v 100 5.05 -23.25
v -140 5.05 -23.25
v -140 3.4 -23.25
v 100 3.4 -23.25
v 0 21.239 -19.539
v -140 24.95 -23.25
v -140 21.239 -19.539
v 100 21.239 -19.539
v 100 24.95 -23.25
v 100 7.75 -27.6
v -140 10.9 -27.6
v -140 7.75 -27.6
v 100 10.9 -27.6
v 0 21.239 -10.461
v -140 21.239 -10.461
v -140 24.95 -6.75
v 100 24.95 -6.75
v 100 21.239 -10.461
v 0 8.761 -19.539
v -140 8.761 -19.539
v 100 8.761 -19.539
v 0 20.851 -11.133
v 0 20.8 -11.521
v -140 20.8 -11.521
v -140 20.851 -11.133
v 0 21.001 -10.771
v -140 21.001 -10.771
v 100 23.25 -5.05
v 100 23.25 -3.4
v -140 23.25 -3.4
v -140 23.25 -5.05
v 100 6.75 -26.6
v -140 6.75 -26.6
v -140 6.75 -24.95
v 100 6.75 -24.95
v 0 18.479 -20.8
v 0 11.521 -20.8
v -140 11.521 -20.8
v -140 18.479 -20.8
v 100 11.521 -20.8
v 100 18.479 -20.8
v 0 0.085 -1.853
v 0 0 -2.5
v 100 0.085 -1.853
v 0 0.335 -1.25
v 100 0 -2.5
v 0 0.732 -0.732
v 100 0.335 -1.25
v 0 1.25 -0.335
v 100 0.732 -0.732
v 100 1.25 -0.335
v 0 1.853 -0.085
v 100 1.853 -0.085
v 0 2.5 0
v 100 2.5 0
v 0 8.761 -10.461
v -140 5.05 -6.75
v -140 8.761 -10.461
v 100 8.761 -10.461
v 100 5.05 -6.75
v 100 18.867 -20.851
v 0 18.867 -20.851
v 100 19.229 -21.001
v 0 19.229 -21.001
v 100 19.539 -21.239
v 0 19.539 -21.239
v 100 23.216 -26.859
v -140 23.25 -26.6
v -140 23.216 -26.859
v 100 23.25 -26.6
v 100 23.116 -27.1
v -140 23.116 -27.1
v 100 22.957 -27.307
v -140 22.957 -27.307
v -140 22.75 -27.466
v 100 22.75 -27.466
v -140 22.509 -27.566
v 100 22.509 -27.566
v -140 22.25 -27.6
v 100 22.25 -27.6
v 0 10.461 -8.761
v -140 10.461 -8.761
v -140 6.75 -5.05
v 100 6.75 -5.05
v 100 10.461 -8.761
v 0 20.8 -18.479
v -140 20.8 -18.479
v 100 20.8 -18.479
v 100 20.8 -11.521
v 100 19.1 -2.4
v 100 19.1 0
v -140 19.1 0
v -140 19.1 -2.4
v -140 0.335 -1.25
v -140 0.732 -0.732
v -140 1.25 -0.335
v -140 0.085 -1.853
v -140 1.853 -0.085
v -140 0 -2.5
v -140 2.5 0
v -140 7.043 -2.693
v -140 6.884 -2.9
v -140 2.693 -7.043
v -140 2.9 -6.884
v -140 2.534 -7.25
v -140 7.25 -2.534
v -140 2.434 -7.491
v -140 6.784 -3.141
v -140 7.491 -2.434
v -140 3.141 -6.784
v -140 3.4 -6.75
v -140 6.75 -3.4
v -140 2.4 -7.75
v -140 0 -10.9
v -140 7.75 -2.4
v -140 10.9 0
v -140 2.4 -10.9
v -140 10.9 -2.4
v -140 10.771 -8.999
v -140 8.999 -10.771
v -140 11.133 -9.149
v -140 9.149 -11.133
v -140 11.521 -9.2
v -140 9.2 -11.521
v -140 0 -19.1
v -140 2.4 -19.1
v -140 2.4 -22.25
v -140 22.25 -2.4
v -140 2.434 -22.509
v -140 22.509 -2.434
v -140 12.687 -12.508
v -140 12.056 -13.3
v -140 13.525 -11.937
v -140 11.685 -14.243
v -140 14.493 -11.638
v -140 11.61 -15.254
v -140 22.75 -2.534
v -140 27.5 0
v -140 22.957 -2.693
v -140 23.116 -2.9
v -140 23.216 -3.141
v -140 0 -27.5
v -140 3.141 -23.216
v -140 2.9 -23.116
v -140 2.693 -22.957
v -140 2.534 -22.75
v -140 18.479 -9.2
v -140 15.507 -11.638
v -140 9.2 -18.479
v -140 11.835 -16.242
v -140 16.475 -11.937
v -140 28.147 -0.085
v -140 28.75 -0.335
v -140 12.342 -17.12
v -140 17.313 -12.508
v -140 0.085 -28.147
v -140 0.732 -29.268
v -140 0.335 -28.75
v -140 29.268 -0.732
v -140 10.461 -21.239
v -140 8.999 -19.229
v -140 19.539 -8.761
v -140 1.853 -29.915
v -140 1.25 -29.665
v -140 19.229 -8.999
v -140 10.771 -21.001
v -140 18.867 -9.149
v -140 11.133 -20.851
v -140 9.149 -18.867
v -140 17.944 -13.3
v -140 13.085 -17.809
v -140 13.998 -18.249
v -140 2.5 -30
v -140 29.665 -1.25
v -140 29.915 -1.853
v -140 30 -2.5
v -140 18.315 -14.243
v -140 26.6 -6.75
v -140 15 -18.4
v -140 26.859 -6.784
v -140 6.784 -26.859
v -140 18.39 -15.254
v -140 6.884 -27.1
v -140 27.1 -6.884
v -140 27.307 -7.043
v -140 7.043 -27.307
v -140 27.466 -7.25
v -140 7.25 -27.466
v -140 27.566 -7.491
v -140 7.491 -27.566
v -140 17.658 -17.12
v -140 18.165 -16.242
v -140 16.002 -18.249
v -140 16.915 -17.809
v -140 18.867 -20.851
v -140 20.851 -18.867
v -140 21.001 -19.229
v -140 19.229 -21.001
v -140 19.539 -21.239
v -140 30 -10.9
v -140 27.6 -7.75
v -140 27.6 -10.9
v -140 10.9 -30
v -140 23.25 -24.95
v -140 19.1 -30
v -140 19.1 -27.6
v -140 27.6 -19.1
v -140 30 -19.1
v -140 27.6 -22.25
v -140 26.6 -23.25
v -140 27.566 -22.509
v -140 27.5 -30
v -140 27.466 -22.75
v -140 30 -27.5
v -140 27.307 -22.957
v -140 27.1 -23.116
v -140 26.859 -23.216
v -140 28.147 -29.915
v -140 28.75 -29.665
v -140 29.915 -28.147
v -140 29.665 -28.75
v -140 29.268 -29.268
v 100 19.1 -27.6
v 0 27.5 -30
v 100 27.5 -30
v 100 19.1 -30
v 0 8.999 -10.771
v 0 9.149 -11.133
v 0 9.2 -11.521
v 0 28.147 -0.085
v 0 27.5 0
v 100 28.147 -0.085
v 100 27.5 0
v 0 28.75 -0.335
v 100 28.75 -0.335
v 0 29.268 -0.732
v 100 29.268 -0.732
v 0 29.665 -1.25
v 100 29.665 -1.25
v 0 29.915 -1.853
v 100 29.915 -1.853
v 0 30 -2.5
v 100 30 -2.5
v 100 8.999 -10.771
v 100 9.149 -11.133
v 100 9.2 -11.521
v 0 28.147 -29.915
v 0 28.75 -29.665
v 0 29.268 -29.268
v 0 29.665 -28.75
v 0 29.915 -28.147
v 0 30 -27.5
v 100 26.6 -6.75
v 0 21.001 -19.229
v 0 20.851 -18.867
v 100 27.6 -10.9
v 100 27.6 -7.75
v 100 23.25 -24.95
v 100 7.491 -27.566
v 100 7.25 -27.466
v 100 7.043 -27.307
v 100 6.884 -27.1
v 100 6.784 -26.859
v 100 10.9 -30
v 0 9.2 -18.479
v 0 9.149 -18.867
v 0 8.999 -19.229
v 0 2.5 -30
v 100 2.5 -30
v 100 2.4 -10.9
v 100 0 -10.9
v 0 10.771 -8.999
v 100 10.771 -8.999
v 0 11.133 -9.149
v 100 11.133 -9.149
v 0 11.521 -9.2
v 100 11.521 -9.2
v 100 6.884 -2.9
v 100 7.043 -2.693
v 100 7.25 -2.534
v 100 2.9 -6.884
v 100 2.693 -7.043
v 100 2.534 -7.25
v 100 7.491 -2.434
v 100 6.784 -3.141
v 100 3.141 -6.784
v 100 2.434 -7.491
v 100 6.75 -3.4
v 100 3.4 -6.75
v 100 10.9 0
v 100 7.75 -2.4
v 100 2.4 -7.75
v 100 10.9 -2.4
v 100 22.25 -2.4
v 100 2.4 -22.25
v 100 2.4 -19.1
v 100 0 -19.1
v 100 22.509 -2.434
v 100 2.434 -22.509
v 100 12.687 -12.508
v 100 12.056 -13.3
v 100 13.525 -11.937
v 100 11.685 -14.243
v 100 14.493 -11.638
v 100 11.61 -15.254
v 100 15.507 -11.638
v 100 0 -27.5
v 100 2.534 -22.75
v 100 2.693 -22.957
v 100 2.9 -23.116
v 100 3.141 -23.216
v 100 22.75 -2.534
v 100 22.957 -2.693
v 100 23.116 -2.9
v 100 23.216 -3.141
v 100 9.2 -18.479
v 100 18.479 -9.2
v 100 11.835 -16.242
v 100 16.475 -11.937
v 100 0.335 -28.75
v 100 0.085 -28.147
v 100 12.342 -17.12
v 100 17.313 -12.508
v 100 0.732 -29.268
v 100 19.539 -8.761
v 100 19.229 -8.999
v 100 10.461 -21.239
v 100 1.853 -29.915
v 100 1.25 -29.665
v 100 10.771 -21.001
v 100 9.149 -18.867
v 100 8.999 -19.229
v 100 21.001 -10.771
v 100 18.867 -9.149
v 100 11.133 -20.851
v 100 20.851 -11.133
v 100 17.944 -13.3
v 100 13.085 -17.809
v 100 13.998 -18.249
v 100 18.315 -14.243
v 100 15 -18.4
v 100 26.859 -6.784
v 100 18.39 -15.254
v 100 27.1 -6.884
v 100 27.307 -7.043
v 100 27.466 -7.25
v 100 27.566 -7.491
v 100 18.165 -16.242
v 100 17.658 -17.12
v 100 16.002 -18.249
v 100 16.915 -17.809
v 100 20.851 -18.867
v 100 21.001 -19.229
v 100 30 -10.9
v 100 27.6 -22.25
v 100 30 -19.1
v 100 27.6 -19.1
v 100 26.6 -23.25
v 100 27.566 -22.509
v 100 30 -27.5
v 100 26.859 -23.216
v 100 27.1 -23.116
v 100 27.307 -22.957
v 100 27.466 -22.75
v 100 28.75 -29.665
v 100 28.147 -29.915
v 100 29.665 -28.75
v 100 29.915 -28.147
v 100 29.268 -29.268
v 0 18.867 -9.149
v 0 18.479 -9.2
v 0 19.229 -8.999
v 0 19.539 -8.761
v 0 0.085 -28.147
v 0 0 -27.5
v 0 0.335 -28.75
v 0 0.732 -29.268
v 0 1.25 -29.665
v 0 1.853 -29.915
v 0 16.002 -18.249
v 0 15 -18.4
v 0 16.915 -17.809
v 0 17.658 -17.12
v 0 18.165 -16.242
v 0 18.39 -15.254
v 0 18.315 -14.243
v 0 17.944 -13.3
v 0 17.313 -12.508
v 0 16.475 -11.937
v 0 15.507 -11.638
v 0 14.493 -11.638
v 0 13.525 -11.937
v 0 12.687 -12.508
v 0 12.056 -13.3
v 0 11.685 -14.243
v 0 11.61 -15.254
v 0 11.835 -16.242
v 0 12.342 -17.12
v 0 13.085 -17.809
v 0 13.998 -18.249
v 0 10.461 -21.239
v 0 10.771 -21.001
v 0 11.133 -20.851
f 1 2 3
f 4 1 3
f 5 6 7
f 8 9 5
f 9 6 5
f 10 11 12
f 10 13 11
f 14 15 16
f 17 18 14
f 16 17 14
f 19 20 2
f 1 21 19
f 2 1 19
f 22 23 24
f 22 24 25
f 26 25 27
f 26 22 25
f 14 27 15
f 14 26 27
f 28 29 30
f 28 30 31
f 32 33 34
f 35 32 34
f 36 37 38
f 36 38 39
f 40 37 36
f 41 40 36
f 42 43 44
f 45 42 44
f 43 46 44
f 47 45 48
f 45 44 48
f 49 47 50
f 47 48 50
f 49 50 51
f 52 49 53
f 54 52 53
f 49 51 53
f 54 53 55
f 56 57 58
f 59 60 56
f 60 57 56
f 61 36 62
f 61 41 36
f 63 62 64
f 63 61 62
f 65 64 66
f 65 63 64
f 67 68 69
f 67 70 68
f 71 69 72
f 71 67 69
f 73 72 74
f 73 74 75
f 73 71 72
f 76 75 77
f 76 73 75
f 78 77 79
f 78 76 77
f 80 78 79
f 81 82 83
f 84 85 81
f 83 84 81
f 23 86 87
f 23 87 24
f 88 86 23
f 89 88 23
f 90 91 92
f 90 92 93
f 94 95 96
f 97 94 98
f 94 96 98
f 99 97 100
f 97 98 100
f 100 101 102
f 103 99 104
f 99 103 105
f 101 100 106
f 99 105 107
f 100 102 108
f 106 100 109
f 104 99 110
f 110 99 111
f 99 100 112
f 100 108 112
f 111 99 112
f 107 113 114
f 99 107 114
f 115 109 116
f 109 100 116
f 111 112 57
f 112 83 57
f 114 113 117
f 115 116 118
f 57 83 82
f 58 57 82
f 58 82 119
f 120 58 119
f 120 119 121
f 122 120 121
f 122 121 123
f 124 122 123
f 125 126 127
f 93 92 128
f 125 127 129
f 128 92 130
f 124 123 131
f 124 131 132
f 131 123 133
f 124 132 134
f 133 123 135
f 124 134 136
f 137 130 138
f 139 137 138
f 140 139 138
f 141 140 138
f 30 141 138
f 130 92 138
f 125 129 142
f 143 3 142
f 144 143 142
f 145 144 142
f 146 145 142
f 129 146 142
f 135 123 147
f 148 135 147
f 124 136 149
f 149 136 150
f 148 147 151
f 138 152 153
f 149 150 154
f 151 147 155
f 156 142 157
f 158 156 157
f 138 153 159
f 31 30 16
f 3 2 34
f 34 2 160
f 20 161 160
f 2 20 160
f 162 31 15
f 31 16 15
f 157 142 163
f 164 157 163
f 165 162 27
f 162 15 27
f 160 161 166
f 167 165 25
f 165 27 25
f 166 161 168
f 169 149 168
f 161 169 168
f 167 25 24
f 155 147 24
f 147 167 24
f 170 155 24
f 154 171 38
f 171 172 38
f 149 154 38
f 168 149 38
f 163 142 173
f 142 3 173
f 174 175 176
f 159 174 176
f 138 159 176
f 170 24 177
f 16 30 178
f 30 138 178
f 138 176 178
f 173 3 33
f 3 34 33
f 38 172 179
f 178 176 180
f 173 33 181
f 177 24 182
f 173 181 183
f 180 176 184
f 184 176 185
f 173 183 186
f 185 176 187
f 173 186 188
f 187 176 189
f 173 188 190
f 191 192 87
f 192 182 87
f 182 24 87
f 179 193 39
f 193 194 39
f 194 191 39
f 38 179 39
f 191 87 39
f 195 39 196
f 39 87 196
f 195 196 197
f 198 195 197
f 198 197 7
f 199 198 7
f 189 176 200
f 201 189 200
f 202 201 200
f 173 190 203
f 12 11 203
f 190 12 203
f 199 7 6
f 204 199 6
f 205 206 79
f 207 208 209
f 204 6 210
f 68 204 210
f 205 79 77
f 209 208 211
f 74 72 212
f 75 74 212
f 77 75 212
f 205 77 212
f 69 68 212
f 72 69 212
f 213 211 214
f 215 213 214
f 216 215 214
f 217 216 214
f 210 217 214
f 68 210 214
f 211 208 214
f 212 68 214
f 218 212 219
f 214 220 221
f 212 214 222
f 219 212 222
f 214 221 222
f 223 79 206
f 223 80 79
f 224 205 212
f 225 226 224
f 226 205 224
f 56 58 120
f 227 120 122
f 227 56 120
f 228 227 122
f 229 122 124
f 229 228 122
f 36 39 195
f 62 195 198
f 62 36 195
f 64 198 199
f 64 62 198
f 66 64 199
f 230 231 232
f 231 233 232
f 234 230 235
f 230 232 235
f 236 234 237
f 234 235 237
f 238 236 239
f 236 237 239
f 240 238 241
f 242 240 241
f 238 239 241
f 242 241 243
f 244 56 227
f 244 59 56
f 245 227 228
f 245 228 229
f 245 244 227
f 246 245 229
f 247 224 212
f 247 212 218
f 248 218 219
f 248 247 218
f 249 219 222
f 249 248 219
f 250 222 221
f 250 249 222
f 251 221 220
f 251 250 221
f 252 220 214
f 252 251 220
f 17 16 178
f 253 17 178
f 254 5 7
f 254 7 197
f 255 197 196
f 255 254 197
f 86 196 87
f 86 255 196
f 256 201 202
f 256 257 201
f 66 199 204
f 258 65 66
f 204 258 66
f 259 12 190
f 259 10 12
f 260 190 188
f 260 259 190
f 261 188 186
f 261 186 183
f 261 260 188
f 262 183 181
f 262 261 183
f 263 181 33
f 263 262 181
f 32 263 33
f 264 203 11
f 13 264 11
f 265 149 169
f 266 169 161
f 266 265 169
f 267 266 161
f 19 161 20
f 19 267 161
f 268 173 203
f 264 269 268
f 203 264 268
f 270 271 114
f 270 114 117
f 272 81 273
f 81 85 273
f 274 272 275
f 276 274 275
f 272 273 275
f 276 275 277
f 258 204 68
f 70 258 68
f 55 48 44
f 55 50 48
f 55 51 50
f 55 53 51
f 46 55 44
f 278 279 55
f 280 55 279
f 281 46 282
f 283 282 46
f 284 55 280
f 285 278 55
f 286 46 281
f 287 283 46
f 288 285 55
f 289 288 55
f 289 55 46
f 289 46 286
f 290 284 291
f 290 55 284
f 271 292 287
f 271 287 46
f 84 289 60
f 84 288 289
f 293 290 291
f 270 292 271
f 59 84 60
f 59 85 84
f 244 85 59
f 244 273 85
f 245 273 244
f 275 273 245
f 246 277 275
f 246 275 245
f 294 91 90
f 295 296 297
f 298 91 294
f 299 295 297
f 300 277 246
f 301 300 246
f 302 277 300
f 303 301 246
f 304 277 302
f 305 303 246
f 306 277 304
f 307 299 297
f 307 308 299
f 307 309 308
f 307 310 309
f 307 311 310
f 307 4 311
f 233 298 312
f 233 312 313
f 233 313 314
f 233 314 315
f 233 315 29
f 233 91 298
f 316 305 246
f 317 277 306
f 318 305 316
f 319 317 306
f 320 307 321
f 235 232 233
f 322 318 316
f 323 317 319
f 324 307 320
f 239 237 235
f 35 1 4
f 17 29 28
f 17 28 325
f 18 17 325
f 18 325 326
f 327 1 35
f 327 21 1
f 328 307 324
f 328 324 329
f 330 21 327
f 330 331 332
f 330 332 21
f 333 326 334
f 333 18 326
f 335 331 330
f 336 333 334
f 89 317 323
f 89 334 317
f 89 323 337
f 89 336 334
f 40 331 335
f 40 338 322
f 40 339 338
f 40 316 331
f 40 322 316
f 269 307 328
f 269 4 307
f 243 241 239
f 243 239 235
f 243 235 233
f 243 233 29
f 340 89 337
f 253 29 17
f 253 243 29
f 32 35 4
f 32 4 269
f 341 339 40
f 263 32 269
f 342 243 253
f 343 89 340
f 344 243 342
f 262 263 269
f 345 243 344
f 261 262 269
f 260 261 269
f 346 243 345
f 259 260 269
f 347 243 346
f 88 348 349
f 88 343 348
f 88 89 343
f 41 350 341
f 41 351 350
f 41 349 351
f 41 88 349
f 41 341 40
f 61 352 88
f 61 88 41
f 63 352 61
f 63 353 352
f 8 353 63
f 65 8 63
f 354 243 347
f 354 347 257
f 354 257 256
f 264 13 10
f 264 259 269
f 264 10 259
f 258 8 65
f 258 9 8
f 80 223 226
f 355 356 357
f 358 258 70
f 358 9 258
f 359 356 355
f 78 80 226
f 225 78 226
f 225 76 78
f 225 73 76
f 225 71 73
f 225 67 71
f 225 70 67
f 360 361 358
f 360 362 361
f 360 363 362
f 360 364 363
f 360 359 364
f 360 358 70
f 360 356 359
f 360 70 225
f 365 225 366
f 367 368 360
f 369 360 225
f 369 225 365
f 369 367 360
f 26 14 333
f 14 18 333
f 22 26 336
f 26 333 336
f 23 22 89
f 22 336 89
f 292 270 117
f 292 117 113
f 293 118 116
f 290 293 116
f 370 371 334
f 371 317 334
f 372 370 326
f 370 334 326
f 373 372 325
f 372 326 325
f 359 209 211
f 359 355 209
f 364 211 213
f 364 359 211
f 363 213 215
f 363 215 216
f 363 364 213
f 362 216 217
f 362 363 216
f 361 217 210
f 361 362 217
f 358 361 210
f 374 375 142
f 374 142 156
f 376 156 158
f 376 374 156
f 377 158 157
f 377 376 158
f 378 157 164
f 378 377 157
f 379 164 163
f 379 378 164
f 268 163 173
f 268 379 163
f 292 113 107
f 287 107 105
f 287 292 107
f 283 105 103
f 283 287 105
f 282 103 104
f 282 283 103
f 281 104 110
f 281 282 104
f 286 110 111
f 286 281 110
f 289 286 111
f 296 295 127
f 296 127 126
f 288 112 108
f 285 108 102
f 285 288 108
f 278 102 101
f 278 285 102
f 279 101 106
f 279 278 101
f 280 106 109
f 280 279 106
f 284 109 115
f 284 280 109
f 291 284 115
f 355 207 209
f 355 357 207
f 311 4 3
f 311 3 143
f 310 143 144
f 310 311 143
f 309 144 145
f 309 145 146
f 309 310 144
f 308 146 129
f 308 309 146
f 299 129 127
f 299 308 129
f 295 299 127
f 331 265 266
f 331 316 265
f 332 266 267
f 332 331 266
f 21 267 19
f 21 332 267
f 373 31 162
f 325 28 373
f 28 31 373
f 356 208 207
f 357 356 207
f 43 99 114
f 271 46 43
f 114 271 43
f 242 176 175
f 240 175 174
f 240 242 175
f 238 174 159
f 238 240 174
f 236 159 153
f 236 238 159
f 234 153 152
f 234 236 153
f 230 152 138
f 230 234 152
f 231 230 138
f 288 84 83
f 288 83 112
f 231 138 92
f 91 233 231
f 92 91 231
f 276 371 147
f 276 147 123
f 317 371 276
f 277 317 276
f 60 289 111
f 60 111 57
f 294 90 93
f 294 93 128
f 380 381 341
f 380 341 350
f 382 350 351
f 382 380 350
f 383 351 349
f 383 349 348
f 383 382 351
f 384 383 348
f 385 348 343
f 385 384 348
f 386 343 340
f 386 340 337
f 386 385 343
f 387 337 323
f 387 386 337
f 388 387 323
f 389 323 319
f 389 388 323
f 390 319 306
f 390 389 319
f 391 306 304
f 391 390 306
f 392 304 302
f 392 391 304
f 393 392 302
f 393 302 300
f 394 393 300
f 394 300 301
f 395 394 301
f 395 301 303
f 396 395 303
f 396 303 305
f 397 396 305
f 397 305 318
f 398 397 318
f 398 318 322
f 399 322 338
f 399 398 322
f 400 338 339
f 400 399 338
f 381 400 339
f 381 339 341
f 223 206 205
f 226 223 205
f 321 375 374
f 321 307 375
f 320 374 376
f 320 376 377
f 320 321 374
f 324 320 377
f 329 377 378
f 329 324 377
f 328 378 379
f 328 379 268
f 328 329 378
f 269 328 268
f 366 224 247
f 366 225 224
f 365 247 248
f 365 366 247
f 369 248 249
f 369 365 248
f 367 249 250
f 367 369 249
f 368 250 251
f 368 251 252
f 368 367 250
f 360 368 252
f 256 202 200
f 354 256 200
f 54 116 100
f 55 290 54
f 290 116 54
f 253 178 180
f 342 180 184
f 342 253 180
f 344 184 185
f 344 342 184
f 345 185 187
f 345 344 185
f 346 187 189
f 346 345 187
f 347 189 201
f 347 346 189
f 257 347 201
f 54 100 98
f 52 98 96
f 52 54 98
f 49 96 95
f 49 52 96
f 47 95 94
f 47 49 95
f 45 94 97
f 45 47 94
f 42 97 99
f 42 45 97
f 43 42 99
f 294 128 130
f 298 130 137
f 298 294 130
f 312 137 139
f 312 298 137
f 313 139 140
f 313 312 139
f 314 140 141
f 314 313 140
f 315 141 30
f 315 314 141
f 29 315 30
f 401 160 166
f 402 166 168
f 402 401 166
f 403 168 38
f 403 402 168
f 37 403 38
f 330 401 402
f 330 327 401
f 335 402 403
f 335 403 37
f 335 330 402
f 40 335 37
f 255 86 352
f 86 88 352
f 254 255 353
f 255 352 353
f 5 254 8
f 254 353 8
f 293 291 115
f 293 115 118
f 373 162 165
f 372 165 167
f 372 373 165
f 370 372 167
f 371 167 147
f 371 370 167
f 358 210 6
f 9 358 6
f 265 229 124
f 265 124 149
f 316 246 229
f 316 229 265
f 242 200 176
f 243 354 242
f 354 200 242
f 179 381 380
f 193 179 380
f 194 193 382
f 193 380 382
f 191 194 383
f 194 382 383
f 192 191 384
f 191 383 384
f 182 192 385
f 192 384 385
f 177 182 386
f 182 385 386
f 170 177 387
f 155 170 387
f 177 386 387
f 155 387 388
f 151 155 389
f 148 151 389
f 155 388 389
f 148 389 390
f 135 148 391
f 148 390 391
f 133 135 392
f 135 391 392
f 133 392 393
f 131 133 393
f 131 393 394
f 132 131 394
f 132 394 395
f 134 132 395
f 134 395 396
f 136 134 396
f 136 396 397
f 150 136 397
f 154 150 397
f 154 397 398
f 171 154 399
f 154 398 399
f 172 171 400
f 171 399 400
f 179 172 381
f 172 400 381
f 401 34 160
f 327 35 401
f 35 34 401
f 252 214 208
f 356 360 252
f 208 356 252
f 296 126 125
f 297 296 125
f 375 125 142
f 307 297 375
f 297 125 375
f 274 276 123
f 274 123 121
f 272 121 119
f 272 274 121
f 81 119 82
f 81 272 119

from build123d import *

# Parameters (mm, degrees)
SKETCH1_R           = 3.4
BOSS_EXTRUDE2_DEPTH = 100
FILLET5_R           = 2.5
FILLET6_R           = 1.5
FILLET7_R           = 1.5
FILLET8_R           = 1
SKETCH3_R           = 3.4
BOSS_EXTRUDE3_DEPTH = 140


with BuildPart() as part:
    # Sketch1 → Boss-Extrude2 (new body)
    with BuildSketch(Plane(origin=(0, 0, 0), x_dir=(0, 0, -1), z_dir=(1, 0, 0))):
        Polygon((10.9, 0), (10.9, 2.4), (6.75, 2.4), (6.75, 5.05), (10.9, 9.2), (19.1, 9.2), (23.25, 5.05), (23.25, 2.4), (19.1, 2.4), (19.1, 0), (30, 0), (30, 10.9), (27.6, 10.9), (27.6, 6.75), (24.95, 6.75), (20.8, 10.9), (20.8, 19.1), (24.95, 23.25), (27.6, 23.25), (27.6, 19.1), (30, 19.1), (30, 30), (19.1, 30), (19.1, 27.6), (23.25, 27.6), (23.25, 24.95), (19.1, 20.8), (10.9, 20.8), (6.75, 24.95), (6.75, 27.6), (10.9, 27.6), (10.9, 30), (0, 30), (0, 19.1), (2.4, 19.1), (2.4, 23.25), (5.05, 23.25), (9.2, 19.1), (9.2, 10.9), (5.05, 6.75), (2.4, 6.75), (2.4, 10.9), (0, 10.9), (0, 0), align=None)
        with Locations((15, 15)):
            Circle(SKETCH1_R, mode=Mode.SUBTRACT)
    extrude(amount=BOSS_EXTRUDE2_DEPTH)

    # Fillet5
    fillet5_edges = [part.edges().sort_by_distance(p)[0] for p in [
        (50, 30, 0),
        (50, 30, -30),
        (50, 0, -30),
        (50, 0, 0),
    ]]
    fillet(fillet5_edges, radius=FILLET5_R)

    # Fillet6
    fillet6_edges = [part.edges().sort_by_distance(p)[0] for p in [
        (50, 10.9, -9.2),
        (50, 19.1, -9.2),
        (50, 19.1, -20.8),
        (50, 10.9, -20.8),
        (50, 9.2, -19.1),
        (50, 9.2, -10.9),
    ]]
    fillet(fillet6_edges, radius=FILLET6_R)

    # Fillet7
    fillet7_edges = [part.edges().sort_by_distance(p)[0] for p in [
        (50, 20.8, -10.9),
        (50, 20.8, -19.1),
    ]]
    fillet(fillet7_edges, radius=FILLET7_R)

    # Fillet8
    fillet8_edges = [part.edges().sort_by_distance(p)[0] for p in [
        (50, 6.75, -2.4),
        (50, 23.25, -2.4),
        (50, 27.6, -6.75),
        (50, 27.6, -23.25),
        (50, 23.25, -27.6),
        (50, 6.75, -27.6),
        (50, 2.4, -23.25),
        (50, 2.4, -6.75),
    ]]
    fillet(fillet8_edges, radius=FILLET8_R)

    # Sketch3 → Boss-Extrude3 (add)
    with BuildSketch(Plane(origin=(0, 0, 0), x_dir=(0, 0, -1), z_dir=(1, 0, 0))):
        with BuildLine():
            Line((10.9, 27.6), (10.9, 30))
            Line((10.9, 30), (2.5, 30))
            ThreePointArc((2.5, 30), (0.732233047, 29.267766953), (0, 27.5))
            Line((0, 27.5), (0, 19.1))
            Line((0, 19.1), (2.4, 19.1))
            Line((2.4, 19.1), (2.4, 22.25))
            ThreePointArc((2.4, 22.25), (2.692893219, 22.957106781), (3.4, 23.25))
            Line((3.4, 23.25), (5.05, 23.25))
            Line((5.05, 23.25), (8.760660172, 19.539339828))
            ThreePointArc((8.760660172, 19.539339828), (9.085819299, 19.052704805), (9.2, 18.478679656))
            Line((9.2, 18.478679656), (9.2, 11.521320344))
            ThreePointArc((9.2, 11.521320344), (9.085819299, 10.947295195), (8.760660172, 10.460660172))
            Line((8.760660172, 10.460660172), (5.05, 6.75))
            Line((5.05, 6.75), (3.4, 6.75))
            ThreePointArc((3.4, 6.75), (2.692893219, 7.042893219), (2.4, 7.75))
            Line((2.4, 7.75), (2.4, 10.9))
            Line((2.4, 10.9), (0, 10.9))
            Line((0, 10.9), (0, 2.5))
            ThreePointArc((0, 2.5), (0.732233047, 0.732233047), (2.5, 0))
            Line((2.5, 0), (10.9, 0))
            Line((10.9, 0), (10.9, 2.4))
            Line((10.9, 2.4), (7.75, 2.4))
            ThreePointArc((7.75, 2.4), (7.042893219, 2.692893219), (6.75, 3.4))
            Line((6.75, 3.4), (6.75, 5.05))
            Line((6.75, 5.05), (10.460660172, 8.760660172))
            ThreePointArc((10.460660172, 8.760660172), (10.947295195, 9.085819299), (11.521320344, 9.2))
            Line((11.521320344, 9.2), (18.478679656, 9.2))
            ThreePointArc((18.478679656, 9.2), (19.052704805, 9.085819299), (19.539339828, 8.760660172))
            Line((19.539339828, 8.760660172), (23.25, 5.05))
            Line((23.25, 5.05), (23.25, 3.4))
            ThreePointArc((23.25, 3.4), (22.957106781, 2.692893219), (22.25, 2.4))
            Line((22.25, 2.4), (19.1, 2.4))
            Line((19.1, 2.4), (19.1, 0))
            Line((19.1, 0), (27.5, 0))
            ThreePointArc((27.5, 0), (29.267766953, 0.732233047), (30, 2.5))
            Line((30, 2.5), (30, 10.9))
            Line((30, 10.9), (27.6, 10.9))
            Line((27.6, 10.9), (27.6, 7.75))
            ThreePointArc((27.6, 7.75), (27.307106781, 7.042893219), (26.6, 6.75))
            Line((26.6, 6.75), (24.95, 6.75))
            Line((24.95, 6.75), (21.239339828, 10.460660172))
            ThreePointArc((21.239339828, 10.460660172), (20.914180701, 10.947295195), (20.8, 11.521320344))
            Line((20.8, 11.521320344), (20.8, 18.478679656))
            ThreePointArc((20.8, 18.478679656), (20.914180701, 19.052704805), (21.239339828, 19.539339828))
            Line((21.239339828, 19.539339828), (24.95, 23.25))
            Line((24.95, 23.25), (26.6, 23.25))
            ThreePointArc((26.6, 23.25), (27.307106781, 22.957106781), (27.6, 22.25))
            Line((27.6, 22.25), (27.6, 19.1))
            Line((27.6, 19.1), (30, 19.1))
            Line((30, 19.1), (30, 27.5))
            ThreePointArc((30, 27.5), (29.267766953, 29.267766953), (27.5, 30))
            Line((27.5, 30), (19.1, 30))
            Line((19.1, 30), (19.1, 27.6))
            Line((19.1, 27.6), (22.25, 27.6))
            ThreePointArc((22.25, 27.6), (22.957106781, 27.307106781), (23.25, 26.6))
            Line((23.25, 26.6), (23.25, 24.95))
            Line((23.25, 24.95), (19.539339828, 21.239339828))
            ThreePointArc((19.539339828, 21.239339828), (19.052704805, 20.914180701), (18.478679656, 20.8))
            Line((18.478679656, 20.8), (11.521320344, 20.8))
            ThreePointArc((11.521320344, 20.8), (10.947295195, 20.914180701), (10.460660172, 21.239339828))
            Line((10.460660172, 21.239339828), (6.75, 24.95))
            Line((6.75, 24.95), (6.75, 26.6))
            ThreePointArc((6.75, 26.6), (7.042893219, 27.307106781), (7.75, 27.6))
            Line((7.75, 27.6), (10.9, 27.6))
        make_face()
        with Locations((15, 15)):
            Circle(SKETCH3_R, mode=Mode.SUBTRACT)
    extrude(amount=-BOSS_EXTRUDE3_DEPTH)


solid = part.part
